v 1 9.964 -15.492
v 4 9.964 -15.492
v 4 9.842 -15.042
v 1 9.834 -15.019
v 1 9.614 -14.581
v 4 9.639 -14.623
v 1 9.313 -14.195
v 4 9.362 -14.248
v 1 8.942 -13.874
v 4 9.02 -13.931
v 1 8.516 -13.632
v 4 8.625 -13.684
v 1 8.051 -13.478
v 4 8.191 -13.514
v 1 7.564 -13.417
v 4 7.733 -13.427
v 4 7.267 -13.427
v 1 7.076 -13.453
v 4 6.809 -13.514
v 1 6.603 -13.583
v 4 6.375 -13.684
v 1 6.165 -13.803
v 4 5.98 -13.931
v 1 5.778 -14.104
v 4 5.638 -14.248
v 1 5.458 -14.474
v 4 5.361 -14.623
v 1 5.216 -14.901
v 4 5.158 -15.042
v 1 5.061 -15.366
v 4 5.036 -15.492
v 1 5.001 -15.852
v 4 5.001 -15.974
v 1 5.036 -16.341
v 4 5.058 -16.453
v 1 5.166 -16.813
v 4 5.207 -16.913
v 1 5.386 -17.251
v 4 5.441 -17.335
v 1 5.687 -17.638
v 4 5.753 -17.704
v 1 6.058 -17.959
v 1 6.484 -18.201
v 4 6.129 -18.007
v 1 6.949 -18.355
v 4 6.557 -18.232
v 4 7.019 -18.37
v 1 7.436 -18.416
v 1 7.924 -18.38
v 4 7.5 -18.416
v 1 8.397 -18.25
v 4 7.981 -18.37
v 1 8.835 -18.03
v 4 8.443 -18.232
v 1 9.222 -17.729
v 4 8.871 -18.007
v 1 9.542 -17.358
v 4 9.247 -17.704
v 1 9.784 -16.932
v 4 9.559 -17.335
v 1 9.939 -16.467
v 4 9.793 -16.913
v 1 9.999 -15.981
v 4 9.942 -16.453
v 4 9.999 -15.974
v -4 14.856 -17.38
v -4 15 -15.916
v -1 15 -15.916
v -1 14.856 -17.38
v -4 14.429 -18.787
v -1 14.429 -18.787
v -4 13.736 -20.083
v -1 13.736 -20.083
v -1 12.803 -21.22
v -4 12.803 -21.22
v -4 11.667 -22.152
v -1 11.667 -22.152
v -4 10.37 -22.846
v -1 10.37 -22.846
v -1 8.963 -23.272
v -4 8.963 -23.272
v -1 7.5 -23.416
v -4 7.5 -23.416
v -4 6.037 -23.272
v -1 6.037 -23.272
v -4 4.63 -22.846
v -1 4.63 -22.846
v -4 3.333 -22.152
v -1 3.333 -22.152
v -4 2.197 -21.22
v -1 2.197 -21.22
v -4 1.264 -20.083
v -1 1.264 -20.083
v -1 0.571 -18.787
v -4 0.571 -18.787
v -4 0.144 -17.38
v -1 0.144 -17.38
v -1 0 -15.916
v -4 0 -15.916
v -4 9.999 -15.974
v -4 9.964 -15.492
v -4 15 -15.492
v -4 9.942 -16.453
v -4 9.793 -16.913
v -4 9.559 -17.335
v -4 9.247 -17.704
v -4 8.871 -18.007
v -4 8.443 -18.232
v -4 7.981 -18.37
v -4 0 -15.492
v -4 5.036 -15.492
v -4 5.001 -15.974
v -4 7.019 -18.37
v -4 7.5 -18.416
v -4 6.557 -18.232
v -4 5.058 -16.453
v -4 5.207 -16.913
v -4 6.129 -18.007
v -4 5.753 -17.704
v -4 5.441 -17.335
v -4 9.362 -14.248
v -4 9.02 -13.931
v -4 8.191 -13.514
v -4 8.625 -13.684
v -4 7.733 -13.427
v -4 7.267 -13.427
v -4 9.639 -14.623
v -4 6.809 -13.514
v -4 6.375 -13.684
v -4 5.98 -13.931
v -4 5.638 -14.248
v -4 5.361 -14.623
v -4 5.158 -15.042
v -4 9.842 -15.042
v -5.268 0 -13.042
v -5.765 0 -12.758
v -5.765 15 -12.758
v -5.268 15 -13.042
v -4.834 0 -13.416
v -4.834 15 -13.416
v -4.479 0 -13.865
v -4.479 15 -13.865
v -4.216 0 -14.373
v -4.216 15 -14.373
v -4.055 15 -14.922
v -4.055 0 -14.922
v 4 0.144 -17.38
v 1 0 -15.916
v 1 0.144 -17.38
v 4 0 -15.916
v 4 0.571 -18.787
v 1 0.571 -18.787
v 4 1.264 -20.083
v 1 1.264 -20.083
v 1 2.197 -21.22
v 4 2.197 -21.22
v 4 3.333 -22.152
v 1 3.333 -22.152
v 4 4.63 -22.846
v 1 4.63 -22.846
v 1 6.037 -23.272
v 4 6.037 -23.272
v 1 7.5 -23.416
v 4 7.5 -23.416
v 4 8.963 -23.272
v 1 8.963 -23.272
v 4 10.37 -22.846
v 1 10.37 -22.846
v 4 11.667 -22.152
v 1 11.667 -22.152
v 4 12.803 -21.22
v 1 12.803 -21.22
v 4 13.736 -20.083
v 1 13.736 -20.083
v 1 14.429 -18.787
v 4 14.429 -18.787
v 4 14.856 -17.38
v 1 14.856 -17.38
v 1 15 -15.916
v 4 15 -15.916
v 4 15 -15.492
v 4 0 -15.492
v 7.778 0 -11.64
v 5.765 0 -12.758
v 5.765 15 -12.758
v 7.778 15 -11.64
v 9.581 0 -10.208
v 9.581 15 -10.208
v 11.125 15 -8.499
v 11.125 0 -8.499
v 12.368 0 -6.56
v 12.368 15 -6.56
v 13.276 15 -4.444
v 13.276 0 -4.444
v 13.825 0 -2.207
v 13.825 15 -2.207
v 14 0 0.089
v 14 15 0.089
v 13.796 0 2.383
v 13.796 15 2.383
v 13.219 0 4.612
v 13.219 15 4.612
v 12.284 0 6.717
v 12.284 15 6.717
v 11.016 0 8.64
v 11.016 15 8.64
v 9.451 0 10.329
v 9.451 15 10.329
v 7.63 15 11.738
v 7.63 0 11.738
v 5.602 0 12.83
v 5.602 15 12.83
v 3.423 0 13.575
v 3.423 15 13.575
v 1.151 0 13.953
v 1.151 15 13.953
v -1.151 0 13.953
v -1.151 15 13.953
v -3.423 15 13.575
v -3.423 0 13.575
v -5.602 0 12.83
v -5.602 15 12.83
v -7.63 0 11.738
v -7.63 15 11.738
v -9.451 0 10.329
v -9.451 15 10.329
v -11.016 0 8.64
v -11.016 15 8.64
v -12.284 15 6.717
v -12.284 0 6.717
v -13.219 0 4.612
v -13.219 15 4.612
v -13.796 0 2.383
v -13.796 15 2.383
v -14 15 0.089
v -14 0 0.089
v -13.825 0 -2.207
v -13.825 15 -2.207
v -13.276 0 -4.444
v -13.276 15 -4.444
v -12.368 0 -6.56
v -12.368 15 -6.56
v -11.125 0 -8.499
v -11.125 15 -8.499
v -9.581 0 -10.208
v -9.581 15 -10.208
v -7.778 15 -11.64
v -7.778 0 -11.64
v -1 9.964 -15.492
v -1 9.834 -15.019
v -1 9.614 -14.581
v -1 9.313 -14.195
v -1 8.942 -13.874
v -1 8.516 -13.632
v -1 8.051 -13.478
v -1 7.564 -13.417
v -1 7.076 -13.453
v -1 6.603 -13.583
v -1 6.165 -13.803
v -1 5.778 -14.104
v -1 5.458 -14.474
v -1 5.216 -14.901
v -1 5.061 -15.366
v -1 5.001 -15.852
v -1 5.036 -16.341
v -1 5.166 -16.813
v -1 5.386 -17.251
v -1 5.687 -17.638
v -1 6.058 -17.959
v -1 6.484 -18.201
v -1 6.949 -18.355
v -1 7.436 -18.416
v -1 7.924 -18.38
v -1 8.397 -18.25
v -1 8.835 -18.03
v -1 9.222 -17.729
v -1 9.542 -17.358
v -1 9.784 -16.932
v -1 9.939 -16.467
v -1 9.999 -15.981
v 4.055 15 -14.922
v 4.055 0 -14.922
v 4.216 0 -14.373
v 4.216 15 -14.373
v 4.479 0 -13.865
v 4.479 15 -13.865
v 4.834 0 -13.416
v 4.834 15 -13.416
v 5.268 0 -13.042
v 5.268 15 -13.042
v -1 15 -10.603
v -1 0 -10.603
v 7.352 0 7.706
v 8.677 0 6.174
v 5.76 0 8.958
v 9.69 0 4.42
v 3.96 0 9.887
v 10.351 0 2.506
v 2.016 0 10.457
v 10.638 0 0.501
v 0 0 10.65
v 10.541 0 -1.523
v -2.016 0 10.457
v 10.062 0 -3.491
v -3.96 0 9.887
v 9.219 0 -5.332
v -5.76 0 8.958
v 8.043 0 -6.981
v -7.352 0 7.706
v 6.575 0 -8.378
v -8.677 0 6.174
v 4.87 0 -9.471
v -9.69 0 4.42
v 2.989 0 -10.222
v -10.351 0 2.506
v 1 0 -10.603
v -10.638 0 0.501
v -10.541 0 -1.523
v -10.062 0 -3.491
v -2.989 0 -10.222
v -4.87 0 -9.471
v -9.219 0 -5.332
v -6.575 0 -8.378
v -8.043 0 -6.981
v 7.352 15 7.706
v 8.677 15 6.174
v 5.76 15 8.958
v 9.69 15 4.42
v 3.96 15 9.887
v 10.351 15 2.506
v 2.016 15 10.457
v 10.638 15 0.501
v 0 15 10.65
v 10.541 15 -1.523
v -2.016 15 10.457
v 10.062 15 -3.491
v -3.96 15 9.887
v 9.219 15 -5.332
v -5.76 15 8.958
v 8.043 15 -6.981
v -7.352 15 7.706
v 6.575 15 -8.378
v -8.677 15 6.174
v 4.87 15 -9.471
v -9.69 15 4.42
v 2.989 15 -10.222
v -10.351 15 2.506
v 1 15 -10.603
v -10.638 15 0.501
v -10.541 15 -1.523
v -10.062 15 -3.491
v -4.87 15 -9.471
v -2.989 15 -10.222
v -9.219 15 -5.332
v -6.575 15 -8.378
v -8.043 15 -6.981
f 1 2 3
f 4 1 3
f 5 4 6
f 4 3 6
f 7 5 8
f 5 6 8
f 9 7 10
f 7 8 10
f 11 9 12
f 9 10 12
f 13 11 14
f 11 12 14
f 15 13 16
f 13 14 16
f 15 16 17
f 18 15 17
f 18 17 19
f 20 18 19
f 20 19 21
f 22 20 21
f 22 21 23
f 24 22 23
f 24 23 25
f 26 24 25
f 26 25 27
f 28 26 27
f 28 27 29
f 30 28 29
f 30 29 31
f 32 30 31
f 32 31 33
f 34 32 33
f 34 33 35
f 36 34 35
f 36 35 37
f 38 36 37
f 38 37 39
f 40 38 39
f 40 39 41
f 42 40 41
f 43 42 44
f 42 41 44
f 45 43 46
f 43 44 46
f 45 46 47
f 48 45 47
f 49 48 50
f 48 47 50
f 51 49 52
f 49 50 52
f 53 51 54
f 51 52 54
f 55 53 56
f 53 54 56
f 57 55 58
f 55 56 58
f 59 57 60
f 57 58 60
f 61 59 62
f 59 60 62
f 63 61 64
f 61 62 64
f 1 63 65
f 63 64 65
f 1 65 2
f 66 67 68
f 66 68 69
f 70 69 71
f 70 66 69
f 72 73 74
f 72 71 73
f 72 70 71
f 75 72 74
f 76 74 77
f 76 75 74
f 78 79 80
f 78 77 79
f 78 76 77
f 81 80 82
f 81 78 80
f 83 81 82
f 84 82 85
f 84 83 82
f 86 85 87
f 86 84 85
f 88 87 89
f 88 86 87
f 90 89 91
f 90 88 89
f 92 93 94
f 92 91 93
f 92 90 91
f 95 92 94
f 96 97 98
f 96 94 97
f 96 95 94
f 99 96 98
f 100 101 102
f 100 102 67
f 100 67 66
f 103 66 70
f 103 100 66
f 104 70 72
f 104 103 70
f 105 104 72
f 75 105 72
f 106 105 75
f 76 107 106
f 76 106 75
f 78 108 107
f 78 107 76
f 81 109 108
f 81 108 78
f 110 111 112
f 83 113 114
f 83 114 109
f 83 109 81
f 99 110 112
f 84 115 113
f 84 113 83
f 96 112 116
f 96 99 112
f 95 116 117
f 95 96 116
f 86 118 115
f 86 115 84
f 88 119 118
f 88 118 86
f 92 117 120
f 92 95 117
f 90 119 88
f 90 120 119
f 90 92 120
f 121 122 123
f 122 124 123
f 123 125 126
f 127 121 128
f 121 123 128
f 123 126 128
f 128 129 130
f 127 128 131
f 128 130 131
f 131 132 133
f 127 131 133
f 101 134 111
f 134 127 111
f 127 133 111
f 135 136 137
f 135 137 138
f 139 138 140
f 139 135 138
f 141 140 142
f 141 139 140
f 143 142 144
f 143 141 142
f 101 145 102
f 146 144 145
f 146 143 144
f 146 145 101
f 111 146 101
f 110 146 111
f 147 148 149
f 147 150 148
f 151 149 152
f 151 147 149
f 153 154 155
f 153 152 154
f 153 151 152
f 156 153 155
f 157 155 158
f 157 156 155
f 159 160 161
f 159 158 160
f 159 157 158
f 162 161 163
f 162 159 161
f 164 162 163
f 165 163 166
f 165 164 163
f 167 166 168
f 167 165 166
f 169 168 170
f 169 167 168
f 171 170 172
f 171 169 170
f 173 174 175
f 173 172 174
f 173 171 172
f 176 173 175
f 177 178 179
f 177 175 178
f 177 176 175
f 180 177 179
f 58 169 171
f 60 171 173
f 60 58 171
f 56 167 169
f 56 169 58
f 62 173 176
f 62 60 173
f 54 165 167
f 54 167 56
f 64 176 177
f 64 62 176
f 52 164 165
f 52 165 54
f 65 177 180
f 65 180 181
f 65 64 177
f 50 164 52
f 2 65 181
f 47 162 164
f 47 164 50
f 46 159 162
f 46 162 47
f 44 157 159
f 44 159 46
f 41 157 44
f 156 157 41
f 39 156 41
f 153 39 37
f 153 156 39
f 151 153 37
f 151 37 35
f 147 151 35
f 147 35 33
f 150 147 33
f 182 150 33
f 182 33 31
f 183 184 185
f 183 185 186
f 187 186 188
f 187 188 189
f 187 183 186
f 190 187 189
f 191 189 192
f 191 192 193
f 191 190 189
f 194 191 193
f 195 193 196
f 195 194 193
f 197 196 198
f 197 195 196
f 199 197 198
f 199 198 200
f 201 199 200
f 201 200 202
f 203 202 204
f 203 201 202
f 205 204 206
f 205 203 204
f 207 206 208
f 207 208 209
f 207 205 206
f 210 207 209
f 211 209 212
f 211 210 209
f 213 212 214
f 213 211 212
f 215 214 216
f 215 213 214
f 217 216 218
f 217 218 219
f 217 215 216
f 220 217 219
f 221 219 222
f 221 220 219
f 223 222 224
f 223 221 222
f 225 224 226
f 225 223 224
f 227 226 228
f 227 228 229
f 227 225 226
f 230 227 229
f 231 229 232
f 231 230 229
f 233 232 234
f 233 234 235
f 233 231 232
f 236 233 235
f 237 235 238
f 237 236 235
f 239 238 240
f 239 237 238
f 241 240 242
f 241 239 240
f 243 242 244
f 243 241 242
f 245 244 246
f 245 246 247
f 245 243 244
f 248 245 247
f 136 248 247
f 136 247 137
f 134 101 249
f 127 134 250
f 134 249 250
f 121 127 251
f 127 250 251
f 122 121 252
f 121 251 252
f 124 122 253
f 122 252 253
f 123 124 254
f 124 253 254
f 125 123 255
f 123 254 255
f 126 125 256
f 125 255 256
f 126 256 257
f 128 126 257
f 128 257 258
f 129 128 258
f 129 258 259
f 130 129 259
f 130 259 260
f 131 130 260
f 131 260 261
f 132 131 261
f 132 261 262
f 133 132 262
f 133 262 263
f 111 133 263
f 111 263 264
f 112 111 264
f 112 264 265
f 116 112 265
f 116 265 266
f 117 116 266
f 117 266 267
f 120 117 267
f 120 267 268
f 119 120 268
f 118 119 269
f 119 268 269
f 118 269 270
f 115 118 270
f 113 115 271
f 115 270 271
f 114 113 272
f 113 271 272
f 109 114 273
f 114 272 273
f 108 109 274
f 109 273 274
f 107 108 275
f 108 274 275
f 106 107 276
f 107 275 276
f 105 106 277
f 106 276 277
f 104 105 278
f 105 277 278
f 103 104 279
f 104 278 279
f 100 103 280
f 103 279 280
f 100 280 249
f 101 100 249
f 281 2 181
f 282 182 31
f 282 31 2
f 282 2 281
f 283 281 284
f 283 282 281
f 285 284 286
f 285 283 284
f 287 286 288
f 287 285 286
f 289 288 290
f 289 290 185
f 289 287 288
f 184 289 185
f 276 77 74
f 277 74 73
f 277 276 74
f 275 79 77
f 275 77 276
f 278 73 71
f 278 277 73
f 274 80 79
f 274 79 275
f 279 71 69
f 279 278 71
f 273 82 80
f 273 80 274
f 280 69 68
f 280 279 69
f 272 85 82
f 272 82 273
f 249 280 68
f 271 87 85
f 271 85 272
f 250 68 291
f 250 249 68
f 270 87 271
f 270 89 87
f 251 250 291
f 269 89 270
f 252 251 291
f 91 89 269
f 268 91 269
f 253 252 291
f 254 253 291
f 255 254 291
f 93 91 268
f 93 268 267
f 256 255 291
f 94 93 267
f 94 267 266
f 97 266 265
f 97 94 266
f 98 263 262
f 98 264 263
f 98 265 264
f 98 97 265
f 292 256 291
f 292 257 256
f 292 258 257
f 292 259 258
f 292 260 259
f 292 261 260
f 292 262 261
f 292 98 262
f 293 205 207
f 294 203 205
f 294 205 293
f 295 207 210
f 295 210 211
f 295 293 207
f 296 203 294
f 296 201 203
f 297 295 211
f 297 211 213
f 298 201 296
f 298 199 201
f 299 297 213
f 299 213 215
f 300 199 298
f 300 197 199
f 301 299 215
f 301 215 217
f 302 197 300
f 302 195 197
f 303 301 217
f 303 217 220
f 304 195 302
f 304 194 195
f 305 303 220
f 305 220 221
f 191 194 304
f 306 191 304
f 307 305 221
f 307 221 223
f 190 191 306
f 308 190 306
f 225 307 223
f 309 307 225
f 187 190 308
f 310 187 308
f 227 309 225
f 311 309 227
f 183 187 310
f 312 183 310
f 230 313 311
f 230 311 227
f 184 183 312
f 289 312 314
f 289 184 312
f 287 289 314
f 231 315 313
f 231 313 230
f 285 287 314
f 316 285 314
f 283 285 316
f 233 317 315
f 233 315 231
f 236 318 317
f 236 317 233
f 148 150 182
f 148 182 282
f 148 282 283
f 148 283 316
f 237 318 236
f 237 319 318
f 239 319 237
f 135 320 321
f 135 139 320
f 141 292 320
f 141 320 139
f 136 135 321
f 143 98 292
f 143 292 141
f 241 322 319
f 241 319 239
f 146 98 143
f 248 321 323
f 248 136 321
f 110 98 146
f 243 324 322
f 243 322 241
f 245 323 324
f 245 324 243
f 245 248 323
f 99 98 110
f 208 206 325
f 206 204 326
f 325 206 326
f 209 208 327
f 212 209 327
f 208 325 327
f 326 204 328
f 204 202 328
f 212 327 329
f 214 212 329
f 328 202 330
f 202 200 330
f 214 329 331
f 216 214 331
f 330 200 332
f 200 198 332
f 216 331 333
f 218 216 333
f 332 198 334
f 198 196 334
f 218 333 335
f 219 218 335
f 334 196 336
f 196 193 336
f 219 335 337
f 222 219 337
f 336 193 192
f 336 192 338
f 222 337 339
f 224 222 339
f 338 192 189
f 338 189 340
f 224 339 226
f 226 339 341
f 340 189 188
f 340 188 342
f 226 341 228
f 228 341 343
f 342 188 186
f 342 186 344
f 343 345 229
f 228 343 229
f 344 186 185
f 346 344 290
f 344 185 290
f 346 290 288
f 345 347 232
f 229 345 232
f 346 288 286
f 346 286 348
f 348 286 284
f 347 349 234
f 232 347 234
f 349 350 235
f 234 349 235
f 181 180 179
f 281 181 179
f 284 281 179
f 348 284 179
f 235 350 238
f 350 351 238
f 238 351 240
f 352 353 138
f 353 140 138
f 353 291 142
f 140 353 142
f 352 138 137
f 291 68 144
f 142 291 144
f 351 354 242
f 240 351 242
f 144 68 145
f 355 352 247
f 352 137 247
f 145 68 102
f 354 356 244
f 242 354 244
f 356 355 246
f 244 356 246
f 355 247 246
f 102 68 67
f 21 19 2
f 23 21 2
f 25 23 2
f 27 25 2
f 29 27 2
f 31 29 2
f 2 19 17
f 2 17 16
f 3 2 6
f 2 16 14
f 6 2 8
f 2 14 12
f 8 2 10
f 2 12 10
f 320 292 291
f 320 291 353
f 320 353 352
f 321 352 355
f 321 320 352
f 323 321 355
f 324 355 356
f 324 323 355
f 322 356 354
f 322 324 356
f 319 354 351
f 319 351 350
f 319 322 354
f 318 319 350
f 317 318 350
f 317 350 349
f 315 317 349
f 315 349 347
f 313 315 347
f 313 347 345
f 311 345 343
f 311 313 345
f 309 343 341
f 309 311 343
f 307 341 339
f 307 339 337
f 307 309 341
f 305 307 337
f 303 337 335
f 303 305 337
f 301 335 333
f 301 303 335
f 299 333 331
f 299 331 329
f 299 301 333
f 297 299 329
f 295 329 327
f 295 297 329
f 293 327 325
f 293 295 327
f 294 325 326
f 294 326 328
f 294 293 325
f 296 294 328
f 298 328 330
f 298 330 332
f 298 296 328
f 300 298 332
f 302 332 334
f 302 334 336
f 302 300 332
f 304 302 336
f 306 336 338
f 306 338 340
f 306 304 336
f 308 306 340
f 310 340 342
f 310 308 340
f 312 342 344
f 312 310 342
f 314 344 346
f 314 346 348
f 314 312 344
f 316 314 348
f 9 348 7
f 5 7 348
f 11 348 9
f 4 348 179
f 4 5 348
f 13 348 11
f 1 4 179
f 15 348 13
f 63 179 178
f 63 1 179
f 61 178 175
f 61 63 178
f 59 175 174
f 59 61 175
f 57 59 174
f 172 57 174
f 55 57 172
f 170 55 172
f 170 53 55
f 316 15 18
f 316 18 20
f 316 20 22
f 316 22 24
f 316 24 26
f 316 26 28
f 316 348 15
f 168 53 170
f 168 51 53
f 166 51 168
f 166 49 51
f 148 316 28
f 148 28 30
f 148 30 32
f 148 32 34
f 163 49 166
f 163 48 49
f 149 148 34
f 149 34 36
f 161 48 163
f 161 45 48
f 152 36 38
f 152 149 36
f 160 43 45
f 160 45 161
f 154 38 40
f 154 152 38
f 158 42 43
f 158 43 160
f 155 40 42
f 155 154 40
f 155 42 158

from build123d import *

# Parameters (mm, degrees)
BOSS_EXTRUDE1_DEPTH = 15
FILLET1_RADIUS      = 7.5
FILLET1_LENGTH      = 3
FILLET2_RADIUS      = 7.5
FILLET2_LENGTH      = 3
CUT_EXTRUDE1_REACH  = 35.126
SKETCH2_R           = 2.5


with BuildPart() as part:
    # Sketch1 → Boss-Extrude1 (new body)
    with BuildSketch(Plane(origin=(0, 0, 0), x_dir=(1, 0, 0), z_dir=(0, 1, 0))):
        with BuildLine():
            Line((1, 10.602947703), (1, 23.416407865))
            Line((1, 23.416407865), (4, 23.416407865))
            Line((4, 23.416407865), (4, 15.491933385))
            ThreePointArc((4, 15.491933385), (4.479495849, 13.864954951), (5.764705882, 12.758062788))
            ThreePointArc((5.764705882, 12.758062788), (0, -14), (-5.764705882, 12.758062788))
            ThreePointArc((-5.764705882, 12.758062788), (-4.479495849, 13.864954951), (-4, 15.491933385))
            Line((-4, 15.491933385), (-4, 23.416407865))
            Line((-4, 23.416407865), (-1, 23.416407865))
            Line((-1, 23.416407865), (-1, 10.602947703))
            ThreePointArc((-1, 10.602947703), (0, -10.65), (1, 10.602947703))
        make_face()
    extrude(amount=BOSS_EXTRUDE1_DEPTH)

    # Fillet1: full round fillet: the end face becomes a half cylinder, R = half its width
    fillet1_face = Plane((-2.5, 7.5, -23.416407865), x_dir=(-1, 0, 0), z_dir=(0, 0, -1))  # on the end face: x along it, z out of the body
    fillet1_slab = fillet1_face.offset(-FILLET1_RADIUS / 2) * Box(FILLET1_LENGTH, 2 * FILLET1_RADIUS, FILLET1_RADIUS, mode=Mode.PRIVATE)  # the body's end, R deep
    fillet1_round = Plane((-2.5, 7.5, -15.916407865), x_dir=(0, 0, -1), z_dir=(-1, 0, 0)) * Cylinder(FILLET1_RADIUS, FILLET1_LENGTH, mode=Mode.PRIVATE)  # its axis R under the face
    add(fillet1_slab - fillet1_round, mode=Mode.SUBTRACT)

    # Fillet2: full round fillet: the end face becomes a half cylinder, R = half its width
    fillet2_face = Plane((2.5, 7.5, -23.416407865), x_dir=(1, 0, 0), z_dir=(0, 0, -1))  # on the end face: x along it, z out of the body
    fillet2_slab = fillet2_face.offset(-FILLET2_RADIUS / 2) * Box(FILLET2_LENGTH, 2 * FILLET2_RADIUS, FILLET2_RADIUS, mode=Mode.PRIVATE)  # the body's end, R deep
    fillet2_round = Plane((2.5, 7.5, -15.916407865), x_dir=(0, 0, -1), z_dir=(1, 0, 0)) * Cylinder(FILLET2_RADIUS, FILLET2_LENGTH, mode=Mode.PRIVATE)  # its axis R under the face
    add(fillet2_slab - fillet2_round, mode=Mode.SUBTRACT)

    # Cut-Extrude1: up to this face of the body (flat: up to its plane)
    cut_extrude1_end = Plane(part.part.faces().sort_by_distance((-4, 7.5, -18.87128147))[0])
    # Sketch2 → Cut-Extrude1 (cut, up to the picked face)
    with BuildSketch(Plane(origin=(4, 0, 0), x_dir=(0, 0, -1), z_dir=(1, 0, 0)), mode=Mode.PRIVATE) as cut_extrude1_sk1:
        with Locations(Location((15.916407865, 7.5, 0), (0, 0, 99.775597353))):
            Circle(SKETCH2_R)
    cut_extrude1_tool1 = split(extrude(cut_extrude1_sk1.sketch, amount=-CUT_EXTRUDE1_REACH, mode=Mode.PRIVATE), bisect_by=cut_extrude1_end, keep=Keep.BOTH, mode=Mode.PRIVATE)
    add(cut_extrude1_tool1.solids().sort_by(Axis((4, 7.5, -15.916408), (-1, 0, 0)))[0], mode=Mode.SUBTRACT)


solid = part.part
